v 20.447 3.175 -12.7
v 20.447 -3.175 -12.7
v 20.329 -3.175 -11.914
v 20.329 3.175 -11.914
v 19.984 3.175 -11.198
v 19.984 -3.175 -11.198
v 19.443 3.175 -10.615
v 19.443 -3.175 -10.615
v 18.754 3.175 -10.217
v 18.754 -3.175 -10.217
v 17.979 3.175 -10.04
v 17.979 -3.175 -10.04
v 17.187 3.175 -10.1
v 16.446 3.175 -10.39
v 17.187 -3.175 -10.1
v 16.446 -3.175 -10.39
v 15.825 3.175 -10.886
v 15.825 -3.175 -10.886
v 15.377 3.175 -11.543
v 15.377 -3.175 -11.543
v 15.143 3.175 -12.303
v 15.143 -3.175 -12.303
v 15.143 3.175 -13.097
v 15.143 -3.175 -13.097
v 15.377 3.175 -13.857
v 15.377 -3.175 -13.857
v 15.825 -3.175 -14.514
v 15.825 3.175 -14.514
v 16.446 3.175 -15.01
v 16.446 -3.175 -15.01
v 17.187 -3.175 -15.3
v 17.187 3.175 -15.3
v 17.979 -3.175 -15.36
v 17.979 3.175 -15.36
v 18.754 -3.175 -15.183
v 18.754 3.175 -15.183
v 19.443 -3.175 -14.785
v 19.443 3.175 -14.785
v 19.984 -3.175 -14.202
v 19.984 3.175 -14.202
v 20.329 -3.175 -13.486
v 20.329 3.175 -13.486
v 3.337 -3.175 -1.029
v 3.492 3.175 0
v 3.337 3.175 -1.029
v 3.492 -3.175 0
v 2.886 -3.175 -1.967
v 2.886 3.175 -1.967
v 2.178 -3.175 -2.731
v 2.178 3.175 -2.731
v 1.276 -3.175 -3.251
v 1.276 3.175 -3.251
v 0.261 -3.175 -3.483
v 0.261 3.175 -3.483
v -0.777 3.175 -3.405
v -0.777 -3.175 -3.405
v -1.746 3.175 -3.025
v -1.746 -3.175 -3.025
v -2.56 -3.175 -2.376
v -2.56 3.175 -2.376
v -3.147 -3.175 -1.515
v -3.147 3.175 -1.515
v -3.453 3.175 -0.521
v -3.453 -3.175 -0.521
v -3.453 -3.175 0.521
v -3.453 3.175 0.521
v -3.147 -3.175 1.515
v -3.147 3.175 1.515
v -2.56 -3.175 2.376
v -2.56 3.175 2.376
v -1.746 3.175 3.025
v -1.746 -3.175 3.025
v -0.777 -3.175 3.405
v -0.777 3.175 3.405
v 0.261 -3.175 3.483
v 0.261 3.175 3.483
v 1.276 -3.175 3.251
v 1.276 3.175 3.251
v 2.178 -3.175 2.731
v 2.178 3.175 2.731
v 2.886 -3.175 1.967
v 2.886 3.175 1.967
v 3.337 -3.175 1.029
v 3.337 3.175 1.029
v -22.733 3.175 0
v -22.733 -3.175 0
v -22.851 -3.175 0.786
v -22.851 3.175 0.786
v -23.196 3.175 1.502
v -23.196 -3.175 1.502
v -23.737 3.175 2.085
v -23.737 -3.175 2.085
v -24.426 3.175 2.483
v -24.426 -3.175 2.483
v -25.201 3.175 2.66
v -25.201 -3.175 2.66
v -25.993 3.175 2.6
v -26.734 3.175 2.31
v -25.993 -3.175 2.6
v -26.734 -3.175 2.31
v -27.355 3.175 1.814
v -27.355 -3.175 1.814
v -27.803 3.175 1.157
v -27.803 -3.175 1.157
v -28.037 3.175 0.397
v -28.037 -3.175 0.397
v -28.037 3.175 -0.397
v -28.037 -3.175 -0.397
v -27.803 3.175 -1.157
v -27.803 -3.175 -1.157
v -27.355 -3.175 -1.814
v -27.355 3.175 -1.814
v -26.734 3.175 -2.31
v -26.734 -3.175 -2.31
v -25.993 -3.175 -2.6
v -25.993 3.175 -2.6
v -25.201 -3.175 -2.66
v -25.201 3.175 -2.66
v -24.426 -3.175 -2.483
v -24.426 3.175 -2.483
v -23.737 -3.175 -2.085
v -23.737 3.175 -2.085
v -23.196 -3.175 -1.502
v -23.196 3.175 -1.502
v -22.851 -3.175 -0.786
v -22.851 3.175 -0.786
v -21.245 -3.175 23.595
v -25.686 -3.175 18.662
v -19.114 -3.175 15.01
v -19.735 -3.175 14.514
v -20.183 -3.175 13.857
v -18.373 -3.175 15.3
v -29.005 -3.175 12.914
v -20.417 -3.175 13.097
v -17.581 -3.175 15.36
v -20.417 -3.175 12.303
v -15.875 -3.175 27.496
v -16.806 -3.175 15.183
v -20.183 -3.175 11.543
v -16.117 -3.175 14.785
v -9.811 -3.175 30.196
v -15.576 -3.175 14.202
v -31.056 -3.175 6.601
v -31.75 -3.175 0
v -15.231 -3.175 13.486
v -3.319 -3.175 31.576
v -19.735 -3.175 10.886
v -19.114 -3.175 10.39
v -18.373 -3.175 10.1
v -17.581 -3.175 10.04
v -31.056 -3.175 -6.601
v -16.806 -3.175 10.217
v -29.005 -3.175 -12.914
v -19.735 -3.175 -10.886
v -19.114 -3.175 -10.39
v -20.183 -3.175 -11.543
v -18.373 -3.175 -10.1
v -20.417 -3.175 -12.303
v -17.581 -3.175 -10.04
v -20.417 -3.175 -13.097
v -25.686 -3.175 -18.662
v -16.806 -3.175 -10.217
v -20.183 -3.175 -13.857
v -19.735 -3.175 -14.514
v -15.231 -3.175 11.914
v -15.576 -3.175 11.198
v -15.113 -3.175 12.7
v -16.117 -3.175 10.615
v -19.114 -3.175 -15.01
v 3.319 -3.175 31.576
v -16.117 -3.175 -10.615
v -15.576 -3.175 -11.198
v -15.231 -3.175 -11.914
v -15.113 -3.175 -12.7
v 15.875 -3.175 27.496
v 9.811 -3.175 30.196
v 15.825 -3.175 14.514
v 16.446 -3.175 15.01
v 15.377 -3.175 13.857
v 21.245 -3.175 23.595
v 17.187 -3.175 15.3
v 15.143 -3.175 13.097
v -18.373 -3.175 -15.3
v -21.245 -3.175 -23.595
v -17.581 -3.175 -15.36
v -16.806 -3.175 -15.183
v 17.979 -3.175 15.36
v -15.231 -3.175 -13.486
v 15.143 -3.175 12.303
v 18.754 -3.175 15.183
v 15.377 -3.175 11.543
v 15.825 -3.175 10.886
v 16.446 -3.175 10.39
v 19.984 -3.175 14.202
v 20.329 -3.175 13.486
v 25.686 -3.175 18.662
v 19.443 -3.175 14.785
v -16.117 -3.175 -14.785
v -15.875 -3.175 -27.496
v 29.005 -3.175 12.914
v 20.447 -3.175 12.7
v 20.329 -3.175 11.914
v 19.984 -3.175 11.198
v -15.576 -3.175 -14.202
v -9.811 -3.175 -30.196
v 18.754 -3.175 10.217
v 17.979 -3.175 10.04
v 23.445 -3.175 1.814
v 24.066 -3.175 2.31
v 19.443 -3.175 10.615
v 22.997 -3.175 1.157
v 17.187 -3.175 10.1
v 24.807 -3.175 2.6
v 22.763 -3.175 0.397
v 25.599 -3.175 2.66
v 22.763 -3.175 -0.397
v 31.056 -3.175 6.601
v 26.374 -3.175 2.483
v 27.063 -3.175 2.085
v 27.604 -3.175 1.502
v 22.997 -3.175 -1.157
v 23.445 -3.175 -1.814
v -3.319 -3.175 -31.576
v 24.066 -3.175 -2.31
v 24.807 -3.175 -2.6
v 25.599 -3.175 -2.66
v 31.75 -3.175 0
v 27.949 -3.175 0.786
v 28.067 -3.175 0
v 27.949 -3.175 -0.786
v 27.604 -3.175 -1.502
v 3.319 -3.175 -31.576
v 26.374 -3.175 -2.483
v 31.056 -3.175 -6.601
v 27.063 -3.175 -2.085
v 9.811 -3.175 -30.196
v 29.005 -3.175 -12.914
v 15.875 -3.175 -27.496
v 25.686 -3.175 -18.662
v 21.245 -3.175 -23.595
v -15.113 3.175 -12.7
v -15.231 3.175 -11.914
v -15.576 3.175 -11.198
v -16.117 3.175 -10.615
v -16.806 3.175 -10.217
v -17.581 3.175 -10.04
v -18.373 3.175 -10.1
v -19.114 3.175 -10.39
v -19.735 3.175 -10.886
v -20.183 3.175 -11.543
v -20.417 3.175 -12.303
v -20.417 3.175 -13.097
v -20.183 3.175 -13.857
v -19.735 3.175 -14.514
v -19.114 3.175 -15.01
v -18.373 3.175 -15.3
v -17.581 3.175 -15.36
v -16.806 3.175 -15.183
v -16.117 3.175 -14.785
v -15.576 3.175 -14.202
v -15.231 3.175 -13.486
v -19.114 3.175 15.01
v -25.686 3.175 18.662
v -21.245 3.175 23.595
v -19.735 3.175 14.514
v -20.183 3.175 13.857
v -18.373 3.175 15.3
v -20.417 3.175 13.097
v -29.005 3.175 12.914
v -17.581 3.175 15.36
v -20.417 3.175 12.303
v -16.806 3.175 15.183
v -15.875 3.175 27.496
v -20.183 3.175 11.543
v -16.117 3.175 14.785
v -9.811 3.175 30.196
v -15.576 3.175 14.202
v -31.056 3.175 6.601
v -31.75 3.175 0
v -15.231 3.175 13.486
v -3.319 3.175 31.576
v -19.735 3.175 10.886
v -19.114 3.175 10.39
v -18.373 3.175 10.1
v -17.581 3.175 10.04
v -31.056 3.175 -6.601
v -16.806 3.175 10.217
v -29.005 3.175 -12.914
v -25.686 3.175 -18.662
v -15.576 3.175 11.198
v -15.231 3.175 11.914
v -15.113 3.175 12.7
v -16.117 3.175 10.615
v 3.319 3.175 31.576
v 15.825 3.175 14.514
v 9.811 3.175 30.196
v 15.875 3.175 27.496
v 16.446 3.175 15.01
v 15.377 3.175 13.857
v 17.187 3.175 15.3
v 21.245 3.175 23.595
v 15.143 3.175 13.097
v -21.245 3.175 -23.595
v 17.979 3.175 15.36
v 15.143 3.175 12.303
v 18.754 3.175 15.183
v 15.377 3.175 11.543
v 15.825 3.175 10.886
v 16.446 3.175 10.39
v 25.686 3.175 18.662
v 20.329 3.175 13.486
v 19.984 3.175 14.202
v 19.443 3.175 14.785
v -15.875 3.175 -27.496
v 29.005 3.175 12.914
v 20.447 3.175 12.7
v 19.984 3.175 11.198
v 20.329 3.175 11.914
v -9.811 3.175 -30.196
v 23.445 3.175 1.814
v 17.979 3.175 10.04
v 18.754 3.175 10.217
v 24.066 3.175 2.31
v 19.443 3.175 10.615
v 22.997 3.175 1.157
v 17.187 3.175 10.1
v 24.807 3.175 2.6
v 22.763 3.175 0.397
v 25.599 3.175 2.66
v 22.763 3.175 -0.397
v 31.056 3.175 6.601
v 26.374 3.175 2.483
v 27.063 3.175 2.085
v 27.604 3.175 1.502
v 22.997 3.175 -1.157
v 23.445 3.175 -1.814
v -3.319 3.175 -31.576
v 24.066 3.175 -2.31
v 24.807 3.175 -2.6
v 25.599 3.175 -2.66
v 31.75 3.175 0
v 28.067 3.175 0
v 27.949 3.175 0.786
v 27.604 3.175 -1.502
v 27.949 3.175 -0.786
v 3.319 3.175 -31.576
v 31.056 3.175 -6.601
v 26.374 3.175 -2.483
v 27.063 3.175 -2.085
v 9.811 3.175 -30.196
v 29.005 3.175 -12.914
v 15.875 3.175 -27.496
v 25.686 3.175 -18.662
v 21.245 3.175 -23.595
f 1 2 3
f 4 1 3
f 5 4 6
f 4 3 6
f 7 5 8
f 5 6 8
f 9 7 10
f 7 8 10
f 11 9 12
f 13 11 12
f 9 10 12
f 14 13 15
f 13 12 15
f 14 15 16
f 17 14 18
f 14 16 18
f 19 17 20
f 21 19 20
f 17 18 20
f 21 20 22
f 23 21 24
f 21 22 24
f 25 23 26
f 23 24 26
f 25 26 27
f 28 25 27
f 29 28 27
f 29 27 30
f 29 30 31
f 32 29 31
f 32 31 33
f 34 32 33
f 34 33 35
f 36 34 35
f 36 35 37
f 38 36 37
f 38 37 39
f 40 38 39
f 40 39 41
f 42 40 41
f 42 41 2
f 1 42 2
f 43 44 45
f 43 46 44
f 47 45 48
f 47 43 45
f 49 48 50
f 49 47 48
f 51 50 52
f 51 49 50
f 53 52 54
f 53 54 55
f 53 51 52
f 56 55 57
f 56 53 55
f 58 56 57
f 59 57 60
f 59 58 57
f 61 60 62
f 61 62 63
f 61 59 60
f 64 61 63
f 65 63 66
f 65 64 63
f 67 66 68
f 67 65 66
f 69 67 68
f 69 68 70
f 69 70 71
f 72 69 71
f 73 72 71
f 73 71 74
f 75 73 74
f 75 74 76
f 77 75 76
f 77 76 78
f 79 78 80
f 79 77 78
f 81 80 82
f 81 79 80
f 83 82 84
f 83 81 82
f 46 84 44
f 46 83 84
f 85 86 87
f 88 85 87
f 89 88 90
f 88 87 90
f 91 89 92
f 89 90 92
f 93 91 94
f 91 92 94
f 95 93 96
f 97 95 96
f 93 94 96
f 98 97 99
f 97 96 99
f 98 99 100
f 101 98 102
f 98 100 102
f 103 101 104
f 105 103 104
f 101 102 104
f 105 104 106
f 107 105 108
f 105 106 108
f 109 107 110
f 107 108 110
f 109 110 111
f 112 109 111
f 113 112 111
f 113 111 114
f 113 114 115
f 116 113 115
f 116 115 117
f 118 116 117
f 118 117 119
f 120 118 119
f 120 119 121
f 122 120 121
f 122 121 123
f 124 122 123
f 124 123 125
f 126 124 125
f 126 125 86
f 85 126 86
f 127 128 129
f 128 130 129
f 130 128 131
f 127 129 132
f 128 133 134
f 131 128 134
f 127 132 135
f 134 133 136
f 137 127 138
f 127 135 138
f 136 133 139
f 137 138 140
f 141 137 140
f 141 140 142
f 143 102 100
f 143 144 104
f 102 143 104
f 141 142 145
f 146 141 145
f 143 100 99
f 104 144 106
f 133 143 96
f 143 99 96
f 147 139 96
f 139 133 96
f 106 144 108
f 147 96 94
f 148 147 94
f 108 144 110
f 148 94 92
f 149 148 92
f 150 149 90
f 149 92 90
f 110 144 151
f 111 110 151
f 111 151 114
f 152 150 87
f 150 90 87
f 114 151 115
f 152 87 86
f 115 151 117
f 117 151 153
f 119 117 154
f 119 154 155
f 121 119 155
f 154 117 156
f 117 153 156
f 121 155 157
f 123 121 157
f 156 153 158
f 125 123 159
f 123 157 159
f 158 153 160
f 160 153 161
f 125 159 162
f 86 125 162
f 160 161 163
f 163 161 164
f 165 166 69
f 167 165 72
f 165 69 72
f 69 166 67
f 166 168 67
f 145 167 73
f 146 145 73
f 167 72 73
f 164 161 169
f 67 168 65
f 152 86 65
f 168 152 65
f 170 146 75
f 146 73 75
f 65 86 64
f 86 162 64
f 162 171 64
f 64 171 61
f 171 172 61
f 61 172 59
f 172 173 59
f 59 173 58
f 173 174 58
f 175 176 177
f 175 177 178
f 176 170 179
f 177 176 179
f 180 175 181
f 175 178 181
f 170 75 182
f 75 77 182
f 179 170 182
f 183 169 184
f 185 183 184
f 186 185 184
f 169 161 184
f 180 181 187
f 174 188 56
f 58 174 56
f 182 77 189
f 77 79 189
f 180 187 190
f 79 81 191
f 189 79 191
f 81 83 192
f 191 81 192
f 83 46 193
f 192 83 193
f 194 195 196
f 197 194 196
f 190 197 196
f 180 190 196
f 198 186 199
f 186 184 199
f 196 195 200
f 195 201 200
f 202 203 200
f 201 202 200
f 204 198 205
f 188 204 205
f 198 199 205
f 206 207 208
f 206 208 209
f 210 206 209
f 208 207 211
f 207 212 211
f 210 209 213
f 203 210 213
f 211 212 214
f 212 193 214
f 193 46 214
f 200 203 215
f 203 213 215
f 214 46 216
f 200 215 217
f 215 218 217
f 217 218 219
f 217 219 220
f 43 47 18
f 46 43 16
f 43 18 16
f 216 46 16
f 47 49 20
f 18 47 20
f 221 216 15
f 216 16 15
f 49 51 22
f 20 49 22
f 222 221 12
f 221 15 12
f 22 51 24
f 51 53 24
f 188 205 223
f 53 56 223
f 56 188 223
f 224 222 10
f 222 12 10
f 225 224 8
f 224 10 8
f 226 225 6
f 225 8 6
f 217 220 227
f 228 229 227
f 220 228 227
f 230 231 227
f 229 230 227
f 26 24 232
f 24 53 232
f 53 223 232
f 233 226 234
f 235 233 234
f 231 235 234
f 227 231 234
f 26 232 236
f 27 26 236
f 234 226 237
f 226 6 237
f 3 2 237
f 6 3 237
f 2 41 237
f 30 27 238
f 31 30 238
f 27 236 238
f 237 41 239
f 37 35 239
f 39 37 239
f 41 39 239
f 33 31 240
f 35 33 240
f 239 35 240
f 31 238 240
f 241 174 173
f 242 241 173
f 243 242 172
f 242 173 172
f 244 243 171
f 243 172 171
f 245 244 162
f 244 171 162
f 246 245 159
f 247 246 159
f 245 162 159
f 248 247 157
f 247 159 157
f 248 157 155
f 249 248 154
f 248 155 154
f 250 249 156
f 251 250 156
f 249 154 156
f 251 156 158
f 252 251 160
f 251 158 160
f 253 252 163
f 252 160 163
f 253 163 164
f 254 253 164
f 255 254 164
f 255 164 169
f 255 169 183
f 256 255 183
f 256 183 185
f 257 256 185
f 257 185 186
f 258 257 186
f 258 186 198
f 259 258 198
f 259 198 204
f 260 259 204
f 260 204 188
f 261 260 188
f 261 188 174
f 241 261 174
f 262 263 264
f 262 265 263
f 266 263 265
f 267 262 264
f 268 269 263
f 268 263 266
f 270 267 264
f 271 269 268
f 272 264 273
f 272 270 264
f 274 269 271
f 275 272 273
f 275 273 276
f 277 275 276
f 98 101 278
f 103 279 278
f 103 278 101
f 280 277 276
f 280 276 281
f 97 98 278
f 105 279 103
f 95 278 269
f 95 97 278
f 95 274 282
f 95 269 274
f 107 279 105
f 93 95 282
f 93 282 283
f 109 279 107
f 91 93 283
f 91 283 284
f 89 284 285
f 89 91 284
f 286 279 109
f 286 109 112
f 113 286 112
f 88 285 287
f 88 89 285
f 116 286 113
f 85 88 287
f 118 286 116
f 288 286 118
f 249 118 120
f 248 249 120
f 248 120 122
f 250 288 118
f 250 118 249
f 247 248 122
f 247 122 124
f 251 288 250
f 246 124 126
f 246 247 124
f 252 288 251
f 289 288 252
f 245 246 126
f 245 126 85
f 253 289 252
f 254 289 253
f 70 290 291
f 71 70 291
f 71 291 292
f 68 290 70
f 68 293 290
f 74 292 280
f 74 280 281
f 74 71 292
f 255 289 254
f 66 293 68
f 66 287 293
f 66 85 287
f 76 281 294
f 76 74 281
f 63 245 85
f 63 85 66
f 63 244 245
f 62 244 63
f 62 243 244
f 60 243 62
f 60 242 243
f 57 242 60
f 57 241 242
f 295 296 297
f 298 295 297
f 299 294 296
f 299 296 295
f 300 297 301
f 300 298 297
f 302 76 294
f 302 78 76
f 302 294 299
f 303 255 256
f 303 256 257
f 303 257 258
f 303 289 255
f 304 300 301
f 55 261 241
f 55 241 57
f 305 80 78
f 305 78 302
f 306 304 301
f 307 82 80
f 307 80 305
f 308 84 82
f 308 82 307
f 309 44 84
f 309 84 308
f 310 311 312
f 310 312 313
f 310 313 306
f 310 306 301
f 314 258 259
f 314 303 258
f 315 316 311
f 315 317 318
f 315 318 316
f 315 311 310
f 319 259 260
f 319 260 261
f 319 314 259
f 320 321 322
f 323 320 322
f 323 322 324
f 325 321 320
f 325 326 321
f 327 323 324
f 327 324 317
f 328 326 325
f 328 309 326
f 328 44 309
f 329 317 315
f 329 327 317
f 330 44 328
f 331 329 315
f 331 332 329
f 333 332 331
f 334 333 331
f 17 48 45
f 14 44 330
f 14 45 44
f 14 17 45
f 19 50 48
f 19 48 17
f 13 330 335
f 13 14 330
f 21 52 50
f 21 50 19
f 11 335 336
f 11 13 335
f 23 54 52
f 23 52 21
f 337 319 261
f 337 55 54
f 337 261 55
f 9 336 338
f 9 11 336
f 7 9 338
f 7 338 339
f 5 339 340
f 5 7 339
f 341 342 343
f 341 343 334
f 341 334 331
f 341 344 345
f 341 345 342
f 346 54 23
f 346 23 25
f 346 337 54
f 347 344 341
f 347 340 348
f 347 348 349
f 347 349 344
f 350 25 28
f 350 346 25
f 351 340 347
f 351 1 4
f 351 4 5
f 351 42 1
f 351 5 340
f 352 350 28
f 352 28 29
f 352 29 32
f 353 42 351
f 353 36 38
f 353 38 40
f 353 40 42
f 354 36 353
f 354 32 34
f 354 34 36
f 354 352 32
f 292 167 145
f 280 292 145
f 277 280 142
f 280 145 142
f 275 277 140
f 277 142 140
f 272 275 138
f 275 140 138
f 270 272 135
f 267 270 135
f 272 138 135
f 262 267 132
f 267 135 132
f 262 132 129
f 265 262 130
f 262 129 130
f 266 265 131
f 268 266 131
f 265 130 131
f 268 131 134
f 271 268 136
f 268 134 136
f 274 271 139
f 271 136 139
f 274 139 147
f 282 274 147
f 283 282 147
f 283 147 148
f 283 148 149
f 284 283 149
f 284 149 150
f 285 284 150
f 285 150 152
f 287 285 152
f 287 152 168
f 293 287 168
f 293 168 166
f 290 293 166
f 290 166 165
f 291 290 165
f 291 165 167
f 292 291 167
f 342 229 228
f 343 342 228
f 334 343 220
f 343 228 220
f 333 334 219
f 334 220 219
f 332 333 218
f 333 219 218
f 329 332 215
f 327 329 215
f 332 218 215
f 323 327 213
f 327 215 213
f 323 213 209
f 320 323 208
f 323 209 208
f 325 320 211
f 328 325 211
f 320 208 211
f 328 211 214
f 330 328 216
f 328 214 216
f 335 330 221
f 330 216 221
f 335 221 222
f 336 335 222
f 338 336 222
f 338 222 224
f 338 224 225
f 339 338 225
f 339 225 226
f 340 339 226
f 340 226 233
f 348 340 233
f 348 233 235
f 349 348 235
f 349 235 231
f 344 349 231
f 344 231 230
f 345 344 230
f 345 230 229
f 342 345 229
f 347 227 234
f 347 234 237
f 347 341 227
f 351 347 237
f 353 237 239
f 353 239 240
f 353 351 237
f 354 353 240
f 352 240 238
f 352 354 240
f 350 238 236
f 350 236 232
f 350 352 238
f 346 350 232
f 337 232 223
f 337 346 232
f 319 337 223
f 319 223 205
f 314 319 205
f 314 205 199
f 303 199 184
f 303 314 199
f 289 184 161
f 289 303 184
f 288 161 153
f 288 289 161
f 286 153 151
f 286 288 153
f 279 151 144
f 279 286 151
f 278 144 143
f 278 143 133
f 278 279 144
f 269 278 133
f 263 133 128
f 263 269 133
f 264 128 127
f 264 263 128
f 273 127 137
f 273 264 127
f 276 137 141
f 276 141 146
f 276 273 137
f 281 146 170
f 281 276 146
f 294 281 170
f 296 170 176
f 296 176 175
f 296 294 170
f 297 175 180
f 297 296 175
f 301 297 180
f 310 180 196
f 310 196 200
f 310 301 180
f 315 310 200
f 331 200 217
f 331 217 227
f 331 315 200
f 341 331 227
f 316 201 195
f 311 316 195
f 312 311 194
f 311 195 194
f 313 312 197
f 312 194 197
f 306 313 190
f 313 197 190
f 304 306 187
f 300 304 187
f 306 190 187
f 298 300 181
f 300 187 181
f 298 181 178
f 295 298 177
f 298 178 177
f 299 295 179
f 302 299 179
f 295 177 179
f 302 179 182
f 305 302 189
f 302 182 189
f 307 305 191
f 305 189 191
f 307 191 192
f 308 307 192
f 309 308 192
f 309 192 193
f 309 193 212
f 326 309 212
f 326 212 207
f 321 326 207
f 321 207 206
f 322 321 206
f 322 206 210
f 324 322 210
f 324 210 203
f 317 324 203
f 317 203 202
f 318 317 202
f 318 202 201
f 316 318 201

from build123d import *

# Parameters (mm, degrees)
SKETCH1_R           = 31.75
SKETCH1_R_2         = 3.4925
BOSS_EXTRUDE1_DEPTH = 3.175
SKETCH2_R           = 2.667
CUT_EXTRUDE1_DEPTH  = 7.35


with BuildPart() as part:
    # Sketch1 → Boss-Extrude1 (new body, symmetric)
    with BuildSketch(Plane(origin=(0, 0, 0), x_dir=(1, 0, 0), z_dir=(0, 1, 0))):
        Circle(SKETCH1_R)
        Circle(SKETCH1_R_2, mode=Mode.SUBTRACT)
    extrude(amount=BOSS_EXTRUDE1_DEPTH, both=True)

    # Sketch2 → Cut-Extrude1 (cut, through all)
    with BuildSketch(Plane.XZ.offset(3.175)):
        with Locations((-17.78, 12.7)):
            Circle(SKETCH2_R)
        with Locations((-25.4, 0)):
            Circle(SKETCH2_R)
        with Locations((-17.78, -12.7)):
            Circle(SKETCH2_R)
        with Locations((17.78, -12.7)):
            Circle(SKETCH2_R)
        with Locations((25.4, 0)):
            Circle(SKETCH2_R)
        with Locations((17.78, 12.7)):
            Circle(SKETCH2_R)
    extrude(amount=-CUT_EXTRUDE1_DEPTH, mode=Mode.SUBTRACT)


solid = part.part
